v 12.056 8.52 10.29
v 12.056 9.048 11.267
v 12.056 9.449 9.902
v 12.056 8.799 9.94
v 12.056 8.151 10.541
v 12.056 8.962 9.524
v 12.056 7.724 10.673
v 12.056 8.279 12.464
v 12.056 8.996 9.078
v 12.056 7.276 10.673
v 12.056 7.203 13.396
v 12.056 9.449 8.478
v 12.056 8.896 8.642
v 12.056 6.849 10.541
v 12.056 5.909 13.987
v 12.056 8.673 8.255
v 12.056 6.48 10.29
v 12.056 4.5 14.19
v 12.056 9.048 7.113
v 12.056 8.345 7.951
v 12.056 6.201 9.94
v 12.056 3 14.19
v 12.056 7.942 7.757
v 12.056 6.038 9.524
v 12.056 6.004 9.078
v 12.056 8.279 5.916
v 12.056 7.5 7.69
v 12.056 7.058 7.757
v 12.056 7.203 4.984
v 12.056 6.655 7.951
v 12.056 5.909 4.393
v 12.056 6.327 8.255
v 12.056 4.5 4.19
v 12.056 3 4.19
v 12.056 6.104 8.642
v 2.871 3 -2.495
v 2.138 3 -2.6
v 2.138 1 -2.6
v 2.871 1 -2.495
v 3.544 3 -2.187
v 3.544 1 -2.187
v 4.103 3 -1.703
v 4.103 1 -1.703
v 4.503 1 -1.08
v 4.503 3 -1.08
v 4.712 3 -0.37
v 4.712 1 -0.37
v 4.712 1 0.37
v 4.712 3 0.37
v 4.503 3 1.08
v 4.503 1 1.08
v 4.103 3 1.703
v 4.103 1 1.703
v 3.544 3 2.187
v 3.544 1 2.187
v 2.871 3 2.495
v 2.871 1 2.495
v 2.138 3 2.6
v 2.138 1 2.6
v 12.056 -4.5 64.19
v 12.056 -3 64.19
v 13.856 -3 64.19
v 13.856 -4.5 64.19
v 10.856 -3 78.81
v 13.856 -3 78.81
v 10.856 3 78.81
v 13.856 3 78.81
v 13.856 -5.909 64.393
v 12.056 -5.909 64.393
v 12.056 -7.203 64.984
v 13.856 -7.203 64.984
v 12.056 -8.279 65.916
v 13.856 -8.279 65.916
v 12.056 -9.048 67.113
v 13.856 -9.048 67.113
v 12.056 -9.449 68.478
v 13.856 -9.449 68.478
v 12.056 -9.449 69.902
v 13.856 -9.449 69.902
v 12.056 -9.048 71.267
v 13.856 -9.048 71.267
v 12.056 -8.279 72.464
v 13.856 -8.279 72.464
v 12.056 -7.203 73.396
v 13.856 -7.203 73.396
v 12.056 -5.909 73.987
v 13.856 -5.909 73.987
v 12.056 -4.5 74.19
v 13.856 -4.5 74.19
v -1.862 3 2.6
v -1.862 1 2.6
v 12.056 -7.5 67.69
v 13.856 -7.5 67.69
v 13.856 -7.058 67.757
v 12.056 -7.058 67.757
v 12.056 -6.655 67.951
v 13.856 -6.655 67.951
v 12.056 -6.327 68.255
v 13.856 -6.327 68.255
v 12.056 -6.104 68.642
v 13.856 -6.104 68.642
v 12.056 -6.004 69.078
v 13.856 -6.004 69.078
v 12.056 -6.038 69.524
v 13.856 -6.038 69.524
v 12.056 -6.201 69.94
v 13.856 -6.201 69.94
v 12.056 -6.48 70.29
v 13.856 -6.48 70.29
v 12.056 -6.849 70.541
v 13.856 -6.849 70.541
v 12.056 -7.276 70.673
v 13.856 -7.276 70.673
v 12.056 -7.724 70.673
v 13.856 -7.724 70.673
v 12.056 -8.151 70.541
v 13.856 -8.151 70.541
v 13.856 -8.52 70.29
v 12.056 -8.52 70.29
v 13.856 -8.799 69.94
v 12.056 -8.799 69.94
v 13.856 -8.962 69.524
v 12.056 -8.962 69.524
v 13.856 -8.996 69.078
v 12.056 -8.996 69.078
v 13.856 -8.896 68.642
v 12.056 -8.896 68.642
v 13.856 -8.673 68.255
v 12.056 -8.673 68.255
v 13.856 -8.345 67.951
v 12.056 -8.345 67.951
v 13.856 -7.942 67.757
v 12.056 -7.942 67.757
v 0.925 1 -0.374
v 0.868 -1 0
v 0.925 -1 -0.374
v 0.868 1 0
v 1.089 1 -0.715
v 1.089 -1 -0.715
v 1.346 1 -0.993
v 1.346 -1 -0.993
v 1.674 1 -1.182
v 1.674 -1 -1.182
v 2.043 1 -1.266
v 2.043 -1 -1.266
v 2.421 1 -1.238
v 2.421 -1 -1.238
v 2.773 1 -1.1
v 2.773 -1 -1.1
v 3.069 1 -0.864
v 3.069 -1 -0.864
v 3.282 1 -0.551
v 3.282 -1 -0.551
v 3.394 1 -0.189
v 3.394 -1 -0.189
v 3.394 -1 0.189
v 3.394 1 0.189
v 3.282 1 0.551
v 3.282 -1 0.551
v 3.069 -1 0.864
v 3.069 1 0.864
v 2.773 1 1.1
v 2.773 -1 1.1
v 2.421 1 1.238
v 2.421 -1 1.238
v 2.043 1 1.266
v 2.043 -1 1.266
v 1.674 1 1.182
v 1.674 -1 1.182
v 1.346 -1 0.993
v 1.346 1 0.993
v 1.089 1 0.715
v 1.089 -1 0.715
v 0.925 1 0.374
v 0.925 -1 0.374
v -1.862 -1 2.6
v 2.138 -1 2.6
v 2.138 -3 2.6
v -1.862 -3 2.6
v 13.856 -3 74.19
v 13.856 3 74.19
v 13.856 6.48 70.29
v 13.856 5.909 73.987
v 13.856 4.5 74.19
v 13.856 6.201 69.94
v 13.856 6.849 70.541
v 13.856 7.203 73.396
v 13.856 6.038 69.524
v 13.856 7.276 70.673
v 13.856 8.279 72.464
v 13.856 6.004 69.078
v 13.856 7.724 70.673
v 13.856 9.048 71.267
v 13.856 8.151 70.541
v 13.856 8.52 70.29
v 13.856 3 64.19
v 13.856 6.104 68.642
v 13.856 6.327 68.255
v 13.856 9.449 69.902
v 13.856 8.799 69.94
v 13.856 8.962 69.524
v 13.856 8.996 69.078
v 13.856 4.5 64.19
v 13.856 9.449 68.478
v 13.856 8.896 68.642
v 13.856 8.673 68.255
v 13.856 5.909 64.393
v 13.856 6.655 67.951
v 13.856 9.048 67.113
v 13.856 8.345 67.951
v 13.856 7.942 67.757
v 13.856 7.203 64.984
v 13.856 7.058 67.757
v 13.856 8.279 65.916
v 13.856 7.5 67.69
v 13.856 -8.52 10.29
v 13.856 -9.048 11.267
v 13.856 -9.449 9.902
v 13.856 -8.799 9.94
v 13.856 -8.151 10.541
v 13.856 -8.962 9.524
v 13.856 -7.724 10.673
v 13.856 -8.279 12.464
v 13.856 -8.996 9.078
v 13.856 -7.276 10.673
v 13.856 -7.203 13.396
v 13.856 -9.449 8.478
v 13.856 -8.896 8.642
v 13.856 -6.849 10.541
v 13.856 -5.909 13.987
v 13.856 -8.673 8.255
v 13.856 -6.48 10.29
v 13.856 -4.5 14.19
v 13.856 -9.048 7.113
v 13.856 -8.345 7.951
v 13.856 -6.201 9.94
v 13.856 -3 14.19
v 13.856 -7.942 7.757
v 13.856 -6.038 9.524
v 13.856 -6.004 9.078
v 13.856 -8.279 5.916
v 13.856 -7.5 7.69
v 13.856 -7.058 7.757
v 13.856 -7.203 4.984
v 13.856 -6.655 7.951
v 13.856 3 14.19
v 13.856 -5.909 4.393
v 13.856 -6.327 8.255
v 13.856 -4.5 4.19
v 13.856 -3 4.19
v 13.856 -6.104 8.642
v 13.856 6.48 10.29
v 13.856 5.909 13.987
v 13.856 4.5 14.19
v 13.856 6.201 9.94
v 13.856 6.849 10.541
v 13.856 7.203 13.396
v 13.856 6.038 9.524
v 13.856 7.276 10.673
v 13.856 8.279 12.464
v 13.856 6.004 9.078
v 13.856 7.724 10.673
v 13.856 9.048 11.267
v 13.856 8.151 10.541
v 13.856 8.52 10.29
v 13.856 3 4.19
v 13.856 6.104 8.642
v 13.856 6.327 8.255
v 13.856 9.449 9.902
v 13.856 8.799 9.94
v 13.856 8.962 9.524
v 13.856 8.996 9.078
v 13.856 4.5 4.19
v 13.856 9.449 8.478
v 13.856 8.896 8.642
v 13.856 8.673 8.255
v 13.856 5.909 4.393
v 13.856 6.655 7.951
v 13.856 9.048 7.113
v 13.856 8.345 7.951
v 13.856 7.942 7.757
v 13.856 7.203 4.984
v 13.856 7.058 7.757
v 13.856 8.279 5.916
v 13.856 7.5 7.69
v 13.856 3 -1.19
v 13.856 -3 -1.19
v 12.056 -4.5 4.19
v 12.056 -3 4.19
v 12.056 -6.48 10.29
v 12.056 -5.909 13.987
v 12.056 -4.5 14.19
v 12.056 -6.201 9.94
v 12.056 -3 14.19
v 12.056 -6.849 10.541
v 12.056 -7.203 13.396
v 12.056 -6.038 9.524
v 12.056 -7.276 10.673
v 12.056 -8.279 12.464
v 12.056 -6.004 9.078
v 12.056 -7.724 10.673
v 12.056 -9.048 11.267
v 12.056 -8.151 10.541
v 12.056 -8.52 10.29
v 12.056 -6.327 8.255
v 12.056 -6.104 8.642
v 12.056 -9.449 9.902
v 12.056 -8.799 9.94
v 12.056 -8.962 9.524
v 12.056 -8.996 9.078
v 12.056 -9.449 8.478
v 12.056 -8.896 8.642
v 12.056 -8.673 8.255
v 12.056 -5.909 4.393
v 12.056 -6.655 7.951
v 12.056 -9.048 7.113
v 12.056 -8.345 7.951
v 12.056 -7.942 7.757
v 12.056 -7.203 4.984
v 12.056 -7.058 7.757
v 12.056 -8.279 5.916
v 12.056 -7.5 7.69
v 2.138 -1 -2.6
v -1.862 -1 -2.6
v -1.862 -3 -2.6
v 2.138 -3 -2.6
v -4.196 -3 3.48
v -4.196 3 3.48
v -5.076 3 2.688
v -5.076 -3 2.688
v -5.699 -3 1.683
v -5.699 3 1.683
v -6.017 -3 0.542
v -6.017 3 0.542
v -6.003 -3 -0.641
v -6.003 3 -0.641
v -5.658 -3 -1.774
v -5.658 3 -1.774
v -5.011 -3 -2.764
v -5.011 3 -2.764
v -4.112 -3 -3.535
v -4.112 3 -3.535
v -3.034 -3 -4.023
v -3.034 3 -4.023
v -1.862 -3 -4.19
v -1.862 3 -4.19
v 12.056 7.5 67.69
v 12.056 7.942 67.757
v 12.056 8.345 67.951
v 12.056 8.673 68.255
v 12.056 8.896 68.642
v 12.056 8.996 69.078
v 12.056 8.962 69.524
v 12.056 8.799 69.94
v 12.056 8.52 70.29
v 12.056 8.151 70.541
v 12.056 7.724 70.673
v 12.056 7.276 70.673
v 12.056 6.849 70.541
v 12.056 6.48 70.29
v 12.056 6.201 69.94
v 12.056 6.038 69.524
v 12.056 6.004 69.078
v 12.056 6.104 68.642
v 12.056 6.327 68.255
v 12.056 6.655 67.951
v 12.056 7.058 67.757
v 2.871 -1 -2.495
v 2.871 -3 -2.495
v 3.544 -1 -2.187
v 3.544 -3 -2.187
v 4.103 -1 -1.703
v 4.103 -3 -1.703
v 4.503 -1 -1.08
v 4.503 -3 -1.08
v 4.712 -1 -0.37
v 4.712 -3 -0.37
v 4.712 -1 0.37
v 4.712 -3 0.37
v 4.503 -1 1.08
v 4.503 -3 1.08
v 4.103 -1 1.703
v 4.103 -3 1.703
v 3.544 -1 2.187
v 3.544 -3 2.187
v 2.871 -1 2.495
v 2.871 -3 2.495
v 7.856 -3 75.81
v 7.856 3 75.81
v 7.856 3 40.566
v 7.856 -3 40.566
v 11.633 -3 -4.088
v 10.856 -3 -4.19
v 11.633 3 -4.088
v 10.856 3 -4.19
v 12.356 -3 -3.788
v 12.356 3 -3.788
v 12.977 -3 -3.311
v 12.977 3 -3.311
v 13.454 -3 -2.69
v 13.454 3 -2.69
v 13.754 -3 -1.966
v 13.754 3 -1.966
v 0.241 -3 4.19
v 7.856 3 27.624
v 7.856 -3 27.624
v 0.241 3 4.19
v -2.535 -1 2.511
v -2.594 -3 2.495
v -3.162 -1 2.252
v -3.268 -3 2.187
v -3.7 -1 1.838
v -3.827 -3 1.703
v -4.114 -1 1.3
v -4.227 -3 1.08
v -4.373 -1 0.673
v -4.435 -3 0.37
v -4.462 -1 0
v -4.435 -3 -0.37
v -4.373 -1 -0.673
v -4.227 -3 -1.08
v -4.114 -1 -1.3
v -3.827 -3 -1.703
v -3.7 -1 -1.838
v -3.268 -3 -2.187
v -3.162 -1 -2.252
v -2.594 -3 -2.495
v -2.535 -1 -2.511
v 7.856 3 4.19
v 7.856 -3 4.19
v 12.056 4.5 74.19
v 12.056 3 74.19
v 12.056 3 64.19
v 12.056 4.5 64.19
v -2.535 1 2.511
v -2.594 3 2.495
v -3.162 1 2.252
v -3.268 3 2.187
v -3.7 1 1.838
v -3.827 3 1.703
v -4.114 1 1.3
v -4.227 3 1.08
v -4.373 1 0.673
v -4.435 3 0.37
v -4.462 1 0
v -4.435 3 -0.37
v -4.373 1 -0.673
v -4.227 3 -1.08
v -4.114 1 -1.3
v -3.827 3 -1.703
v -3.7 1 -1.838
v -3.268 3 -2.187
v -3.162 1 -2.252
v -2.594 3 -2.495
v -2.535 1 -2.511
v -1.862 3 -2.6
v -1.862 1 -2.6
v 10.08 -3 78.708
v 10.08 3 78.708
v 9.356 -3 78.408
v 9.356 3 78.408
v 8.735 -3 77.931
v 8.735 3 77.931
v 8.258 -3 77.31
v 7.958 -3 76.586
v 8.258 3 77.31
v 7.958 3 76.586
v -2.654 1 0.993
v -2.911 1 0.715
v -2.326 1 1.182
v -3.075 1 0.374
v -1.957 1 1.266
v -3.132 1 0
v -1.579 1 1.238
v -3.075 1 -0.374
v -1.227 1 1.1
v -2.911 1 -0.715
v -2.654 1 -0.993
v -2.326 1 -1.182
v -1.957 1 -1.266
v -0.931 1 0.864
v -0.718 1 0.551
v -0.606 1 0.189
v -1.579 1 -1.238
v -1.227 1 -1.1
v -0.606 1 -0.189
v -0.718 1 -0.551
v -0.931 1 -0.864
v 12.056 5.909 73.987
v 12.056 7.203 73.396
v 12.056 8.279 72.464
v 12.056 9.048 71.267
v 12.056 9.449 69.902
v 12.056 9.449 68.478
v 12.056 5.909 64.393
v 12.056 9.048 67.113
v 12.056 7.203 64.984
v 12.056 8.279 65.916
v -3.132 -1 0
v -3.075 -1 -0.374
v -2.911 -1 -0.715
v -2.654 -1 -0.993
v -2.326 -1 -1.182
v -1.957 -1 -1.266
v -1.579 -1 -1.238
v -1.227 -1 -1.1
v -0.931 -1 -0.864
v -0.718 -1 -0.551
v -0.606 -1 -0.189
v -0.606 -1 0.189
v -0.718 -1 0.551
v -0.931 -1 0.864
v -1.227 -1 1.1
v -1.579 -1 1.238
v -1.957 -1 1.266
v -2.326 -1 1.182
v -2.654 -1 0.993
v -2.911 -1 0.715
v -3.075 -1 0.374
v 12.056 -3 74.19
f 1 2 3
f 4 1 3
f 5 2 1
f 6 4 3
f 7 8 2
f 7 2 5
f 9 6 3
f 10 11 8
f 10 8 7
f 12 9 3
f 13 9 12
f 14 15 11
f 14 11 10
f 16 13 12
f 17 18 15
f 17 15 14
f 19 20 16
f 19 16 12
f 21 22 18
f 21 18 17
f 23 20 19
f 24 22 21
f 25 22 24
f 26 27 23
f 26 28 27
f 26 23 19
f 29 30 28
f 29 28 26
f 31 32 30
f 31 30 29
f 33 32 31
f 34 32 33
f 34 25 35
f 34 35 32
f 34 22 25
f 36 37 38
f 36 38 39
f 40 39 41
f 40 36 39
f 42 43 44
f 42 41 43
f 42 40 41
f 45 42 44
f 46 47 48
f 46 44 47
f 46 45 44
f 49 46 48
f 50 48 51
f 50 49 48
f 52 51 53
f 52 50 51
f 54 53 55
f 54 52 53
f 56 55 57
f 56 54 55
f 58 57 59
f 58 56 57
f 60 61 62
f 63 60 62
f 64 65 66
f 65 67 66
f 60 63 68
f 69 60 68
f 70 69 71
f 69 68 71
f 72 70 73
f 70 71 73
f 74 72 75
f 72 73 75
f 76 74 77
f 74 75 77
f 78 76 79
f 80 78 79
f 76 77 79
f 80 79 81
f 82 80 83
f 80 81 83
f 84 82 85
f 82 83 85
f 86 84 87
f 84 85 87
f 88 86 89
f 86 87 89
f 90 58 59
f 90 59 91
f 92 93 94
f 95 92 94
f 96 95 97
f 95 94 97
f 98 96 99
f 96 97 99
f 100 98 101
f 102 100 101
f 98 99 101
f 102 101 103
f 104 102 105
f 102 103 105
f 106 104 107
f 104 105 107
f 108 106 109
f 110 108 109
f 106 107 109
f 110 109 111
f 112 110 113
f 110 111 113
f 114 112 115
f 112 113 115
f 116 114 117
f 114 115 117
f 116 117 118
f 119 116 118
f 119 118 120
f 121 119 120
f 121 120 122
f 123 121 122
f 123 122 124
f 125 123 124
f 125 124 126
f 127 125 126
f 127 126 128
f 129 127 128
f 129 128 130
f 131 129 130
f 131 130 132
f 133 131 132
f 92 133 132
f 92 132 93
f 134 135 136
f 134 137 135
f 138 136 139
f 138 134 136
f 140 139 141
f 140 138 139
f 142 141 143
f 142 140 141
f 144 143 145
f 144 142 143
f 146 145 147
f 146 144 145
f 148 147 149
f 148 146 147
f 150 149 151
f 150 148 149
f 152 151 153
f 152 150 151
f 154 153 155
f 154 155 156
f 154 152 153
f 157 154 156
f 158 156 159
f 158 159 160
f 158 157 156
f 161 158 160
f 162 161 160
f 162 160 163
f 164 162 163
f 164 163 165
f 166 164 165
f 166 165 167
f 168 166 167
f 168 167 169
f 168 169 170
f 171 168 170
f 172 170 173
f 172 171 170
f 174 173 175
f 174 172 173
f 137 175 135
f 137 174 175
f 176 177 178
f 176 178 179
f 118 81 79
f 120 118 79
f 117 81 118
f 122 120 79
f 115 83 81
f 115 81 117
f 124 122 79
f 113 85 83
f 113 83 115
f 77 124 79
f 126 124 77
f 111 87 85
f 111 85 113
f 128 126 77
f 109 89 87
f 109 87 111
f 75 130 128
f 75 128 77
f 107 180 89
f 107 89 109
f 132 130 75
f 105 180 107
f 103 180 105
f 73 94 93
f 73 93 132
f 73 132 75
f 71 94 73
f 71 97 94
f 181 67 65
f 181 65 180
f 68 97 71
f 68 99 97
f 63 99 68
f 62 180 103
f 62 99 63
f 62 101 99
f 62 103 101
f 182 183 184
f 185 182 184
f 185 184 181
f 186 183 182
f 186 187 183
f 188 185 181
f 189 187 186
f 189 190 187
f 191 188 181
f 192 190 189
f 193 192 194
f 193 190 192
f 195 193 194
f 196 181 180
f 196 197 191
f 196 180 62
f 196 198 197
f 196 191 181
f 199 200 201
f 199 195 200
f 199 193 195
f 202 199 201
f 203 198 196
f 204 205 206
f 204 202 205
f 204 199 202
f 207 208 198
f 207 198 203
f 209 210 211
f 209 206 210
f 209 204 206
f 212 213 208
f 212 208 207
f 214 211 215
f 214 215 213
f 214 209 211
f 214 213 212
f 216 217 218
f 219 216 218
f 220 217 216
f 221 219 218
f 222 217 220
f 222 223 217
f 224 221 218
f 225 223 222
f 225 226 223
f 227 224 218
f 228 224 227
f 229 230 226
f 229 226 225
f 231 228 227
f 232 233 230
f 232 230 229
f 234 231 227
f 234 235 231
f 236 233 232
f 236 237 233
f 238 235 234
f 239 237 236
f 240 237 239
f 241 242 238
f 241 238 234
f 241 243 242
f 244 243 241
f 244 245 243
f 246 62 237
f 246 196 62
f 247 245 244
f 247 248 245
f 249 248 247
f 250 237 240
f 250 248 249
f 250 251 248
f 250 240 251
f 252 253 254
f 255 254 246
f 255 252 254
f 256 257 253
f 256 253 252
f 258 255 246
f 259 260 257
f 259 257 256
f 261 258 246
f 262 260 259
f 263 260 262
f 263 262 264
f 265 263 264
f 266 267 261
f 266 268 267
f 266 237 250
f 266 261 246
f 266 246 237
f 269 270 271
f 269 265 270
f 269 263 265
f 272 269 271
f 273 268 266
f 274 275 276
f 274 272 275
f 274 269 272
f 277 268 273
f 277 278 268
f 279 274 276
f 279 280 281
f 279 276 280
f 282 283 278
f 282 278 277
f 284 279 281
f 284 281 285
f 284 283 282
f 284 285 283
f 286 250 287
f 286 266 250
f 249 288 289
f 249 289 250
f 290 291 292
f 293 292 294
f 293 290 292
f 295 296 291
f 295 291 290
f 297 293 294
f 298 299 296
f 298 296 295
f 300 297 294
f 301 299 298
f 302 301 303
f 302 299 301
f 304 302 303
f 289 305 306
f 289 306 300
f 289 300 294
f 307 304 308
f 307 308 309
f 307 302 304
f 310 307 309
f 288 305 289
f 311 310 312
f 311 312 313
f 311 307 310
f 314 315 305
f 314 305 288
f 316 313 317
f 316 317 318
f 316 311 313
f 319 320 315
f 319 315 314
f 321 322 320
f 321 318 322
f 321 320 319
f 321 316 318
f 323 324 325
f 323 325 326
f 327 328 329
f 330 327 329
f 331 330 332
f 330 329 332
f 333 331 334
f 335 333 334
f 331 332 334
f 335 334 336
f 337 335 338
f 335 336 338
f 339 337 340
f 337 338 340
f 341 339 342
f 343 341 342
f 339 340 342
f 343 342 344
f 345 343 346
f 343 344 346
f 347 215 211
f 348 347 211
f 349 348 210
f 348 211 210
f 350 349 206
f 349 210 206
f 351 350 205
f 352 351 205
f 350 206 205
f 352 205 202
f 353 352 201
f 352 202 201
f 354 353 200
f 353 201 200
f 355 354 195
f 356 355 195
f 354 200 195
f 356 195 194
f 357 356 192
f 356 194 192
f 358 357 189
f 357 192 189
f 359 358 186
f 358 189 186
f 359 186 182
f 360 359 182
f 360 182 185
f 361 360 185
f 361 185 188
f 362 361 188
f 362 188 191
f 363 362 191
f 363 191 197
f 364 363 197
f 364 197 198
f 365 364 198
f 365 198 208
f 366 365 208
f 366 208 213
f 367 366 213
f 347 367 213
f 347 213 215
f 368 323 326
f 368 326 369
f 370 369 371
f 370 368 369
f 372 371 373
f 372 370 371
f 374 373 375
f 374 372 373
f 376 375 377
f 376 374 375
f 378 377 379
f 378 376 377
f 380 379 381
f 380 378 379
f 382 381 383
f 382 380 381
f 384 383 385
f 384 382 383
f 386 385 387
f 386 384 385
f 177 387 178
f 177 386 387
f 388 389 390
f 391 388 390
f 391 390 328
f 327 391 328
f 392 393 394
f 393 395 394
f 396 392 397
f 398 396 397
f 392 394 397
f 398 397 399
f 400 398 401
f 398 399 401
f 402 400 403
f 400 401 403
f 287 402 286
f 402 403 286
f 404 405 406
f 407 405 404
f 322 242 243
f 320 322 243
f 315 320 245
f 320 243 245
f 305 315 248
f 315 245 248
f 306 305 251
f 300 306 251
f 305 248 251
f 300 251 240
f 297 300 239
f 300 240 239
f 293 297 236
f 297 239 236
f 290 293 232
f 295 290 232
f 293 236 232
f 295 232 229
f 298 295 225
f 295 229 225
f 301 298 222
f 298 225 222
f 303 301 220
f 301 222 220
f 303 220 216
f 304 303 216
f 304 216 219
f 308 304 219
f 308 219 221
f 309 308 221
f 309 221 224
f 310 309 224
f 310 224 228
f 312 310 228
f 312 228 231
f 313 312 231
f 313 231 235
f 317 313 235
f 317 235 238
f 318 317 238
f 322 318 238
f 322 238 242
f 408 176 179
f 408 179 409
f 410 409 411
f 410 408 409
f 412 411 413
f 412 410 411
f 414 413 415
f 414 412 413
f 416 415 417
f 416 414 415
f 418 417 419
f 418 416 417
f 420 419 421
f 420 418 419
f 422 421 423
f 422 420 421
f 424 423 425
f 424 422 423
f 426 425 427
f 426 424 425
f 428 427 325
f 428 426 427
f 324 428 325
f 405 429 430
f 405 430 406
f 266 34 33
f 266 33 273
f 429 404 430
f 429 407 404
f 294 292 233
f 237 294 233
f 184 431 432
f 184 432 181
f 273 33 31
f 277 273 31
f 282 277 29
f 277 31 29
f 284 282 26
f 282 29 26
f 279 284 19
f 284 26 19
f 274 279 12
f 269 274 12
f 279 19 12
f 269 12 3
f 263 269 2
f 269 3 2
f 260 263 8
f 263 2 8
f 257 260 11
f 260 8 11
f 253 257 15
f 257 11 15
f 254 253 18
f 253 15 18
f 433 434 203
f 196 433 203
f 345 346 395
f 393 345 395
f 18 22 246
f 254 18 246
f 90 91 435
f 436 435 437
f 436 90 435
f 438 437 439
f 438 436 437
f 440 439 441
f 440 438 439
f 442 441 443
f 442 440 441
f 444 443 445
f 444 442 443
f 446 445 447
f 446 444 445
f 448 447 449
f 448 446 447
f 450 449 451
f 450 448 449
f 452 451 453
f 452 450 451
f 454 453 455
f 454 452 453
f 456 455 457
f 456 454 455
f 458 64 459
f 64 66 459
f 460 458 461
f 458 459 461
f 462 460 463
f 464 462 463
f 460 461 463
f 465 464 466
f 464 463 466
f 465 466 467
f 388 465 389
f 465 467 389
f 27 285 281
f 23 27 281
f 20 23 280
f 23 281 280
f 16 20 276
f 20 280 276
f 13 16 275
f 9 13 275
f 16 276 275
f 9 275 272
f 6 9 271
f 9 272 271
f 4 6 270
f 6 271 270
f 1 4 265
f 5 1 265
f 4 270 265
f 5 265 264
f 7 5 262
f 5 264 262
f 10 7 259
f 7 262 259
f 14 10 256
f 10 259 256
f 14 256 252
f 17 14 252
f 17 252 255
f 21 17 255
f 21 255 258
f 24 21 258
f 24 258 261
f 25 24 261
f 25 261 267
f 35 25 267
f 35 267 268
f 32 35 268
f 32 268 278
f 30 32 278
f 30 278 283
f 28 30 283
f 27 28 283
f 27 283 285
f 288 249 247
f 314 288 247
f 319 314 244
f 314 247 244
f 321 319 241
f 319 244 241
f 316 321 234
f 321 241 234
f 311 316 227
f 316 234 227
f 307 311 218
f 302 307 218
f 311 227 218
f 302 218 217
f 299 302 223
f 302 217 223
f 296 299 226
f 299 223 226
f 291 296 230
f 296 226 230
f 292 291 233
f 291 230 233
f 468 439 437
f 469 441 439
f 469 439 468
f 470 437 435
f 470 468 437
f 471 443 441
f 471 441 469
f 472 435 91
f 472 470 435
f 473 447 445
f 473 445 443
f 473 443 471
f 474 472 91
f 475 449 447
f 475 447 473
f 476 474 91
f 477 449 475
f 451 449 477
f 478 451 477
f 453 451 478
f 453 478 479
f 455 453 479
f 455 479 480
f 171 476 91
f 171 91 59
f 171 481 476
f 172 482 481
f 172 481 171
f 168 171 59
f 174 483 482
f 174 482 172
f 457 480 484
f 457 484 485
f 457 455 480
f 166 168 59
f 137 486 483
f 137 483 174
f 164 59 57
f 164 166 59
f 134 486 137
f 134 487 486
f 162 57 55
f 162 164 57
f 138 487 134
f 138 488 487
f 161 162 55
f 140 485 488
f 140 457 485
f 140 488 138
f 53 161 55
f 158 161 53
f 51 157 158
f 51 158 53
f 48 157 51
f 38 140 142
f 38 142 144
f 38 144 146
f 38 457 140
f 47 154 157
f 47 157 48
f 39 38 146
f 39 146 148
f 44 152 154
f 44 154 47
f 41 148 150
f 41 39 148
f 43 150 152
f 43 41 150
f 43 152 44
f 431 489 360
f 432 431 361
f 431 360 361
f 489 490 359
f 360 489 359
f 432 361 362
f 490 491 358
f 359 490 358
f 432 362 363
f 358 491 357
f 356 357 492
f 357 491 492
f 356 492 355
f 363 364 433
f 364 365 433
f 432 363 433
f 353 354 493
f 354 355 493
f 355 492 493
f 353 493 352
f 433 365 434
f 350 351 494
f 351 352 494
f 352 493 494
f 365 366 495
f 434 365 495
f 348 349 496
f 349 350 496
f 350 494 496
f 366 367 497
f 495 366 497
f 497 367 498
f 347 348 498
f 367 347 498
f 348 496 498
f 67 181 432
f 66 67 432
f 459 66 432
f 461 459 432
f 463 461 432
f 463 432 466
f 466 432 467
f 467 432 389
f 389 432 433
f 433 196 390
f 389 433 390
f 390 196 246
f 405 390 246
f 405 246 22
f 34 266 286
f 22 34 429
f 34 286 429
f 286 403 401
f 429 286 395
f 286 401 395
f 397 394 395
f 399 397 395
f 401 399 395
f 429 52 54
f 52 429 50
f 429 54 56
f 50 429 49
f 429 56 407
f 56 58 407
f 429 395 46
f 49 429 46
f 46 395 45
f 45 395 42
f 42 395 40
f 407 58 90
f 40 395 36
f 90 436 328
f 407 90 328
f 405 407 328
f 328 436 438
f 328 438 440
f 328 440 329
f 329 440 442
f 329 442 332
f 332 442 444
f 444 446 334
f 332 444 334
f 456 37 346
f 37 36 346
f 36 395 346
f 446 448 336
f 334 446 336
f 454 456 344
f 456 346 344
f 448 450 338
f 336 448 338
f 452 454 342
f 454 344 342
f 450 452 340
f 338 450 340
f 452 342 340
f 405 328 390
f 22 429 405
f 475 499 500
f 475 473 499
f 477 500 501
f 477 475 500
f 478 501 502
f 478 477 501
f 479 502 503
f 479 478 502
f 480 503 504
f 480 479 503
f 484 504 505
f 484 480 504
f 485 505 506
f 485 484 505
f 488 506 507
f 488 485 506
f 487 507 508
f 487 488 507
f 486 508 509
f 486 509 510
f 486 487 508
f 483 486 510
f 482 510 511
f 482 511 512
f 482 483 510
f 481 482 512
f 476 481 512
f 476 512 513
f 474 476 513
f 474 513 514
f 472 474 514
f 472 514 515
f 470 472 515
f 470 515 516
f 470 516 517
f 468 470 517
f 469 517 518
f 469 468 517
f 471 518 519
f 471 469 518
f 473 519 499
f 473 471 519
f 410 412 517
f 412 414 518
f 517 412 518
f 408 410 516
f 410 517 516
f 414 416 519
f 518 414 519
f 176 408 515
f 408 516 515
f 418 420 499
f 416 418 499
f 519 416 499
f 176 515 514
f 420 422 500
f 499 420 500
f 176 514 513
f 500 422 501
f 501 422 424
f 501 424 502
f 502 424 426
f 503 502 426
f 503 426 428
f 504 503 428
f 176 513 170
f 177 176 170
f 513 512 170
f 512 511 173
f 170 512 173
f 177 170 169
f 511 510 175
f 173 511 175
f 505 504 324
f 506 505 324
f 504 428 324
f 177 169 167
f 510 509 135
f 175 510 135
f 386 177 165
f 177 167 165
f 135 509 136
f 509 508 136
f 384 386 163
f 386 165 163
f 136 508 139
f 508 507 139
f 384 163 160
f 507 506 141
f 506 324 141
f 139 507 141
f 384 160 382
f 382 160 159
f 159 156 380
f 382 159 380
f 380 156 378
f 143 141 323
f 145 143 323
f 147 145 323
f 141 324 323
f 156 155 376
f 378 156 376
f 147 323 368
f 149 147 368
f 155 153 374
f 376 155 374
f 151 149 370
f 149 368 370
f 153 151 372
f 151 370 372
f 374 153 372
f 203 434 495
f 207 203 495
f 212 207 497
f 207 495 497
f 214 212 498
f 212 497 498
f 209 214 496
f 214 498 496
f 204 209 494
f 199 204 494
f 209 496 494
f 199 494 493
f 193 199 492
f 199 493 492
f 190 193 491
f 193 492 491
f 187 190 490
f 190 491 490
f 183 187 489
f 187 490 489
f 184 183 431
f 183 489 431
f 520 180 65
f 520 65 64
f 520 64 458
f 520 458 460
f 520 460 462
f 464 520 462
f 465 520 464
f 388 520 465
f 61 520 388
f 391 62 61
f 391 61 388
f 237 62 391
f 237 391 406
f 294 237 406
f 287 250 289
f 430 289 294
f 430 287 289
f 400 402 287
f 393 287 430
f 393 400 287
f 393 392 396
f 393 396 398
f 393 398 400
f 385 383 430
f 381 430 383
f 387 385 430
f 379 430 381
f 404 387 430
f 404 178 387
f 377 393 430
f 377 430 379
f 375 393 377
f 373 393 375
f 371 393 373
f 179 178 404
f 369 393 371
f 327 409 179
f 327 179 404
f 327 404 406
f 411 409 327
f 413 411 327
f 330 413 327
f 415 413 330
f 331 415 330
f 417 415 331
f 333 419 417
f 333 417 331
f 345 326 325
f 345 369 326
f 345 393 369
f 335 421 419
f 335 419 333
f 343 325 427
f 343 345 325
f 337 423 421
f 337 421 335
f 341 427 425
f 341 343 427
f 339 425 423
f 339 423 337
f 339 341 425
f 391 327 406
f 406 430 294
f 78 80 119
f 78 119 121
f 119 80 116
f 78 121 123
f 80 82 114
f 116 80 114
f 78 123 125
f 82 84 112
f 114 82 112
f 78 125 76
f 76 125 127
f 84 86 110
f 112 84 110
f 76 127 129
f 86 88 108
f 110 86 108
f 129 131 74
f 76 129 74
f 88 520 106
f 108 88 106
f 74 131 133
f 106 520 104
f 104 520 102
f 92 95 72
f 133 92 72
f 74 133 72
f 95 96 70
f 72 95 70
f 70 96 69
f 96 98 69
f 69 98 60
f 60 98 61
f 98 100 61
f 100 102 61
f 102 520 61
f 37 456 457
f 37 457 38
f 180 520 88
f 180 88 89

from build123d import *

# Parameters (mm, degrees)
SALIENTE_EXTRUIR1_DEPTH = 3
SALIENTE_EXTRUIR2_DEPTH = 1
CROQUIS1_7_W            = 1.8
CROQUIS1_7_H            = 10
SALIENTE_EXTRUIR4_DEPTH = 9.5
REDONDEO2_R             = 5
CROQUIS3_R              = 1.5
CORTAR_EXTRUIR2_DEPTH   = 16


with BuildPart() as part:
    # Croquis1 → Saliente-Extruir1 (new, symmetric)
    with BuildSketch(Plane(origin=(0, 0, 0), x_dir=(1, 0, 0), z_dir=(0, 1, 0))):
        with BuildLine():
            Line((-1.861867424, 4.190006044), (10.856046359, 4.190006044))
            ThreePointArc((10.856046359, 4.190006044), (12.977366702, 3.311326387), (13.856046359, 1.190006044))
            Line((13.856046359, 1.190006044), (13.856046359, -78.809993956))
            Line((13.856046359, -78.809993956), (10.856046359, -78.809993956))
            ThreePointArc((10.856046359, -78.809993956), (8.734726015, -77.9313143), (7.856046359, -75.809993956))
            Line((7.856046359, -75.809993956), (7.856046359, -40.566421369))
            Line((7.856046359, -40.566421369), (-4.195556186, -3.47994934))
            ThreePointArc((-4.195556186, -3.47994934), (-5.870430721, 1.219660174), (-1.861867424, 4.190006044))
        make_face()
        with BuildLine():
            Line((-1.861867424, 2.6), (2.138132576, 2.6))
            ThreePointArc((2.138132576, 2.6), (4.738132576, 0), (2.138132576, -2.6))
            Line((2.138132576, -2.6), (-1.861867424, -2.6))
            ThreePointArc((-1.861867424, -2.6), (-4.461867424, 0), (-1.861867424, 2.6))
        make_face(mode=Mode.SUBTRACT)
        Polygon((0.241081645, -4.190006044), (7.856046359, -4.190006044), (7.856046359, -27.623584675), align=None, mode=Mode.SUBTRACT)
    extrude(amount=SALIENTE_EXTRUIR1_DEPTH, both=True)

    # Croquis1<3> → Saliente-Extruir2 (add, symmetric)
    with BuildSketch(Plane(origin=(0, 0, 0), x_dir=(1, 0, 0), z_dir=(0, 1, 0))):
        with BuildLine():
            ThreePointArc((-1.861867424, 2.6), (-3.700345055, 1.838477631), (-4.461867424, 0))
            ThreePointArc((-4.461867424, 0), (-3.700345055, -1.838477631), (-1.861867424, -2.6))
            Line((-1.861867424, -2.6), (2.138132576, -2.6))
            ThreePointArc((2.138132576, -2.6), (4.738132576, 0), (2.138132576, 2.6))
            Line((2.138132576, 2.6), (-1.861867424, 2.6))
        make_face()
        with BuildLine():
            ThreePointArc((-0.591867424, 0), (-1.861867424, -1.27), (-3.131867424, 0))
            ThreePointArc((-3.131867424, 0), (-1.861867424, 1.27), (-0.591867424, 0))
        make_face(mode=Mode.SUBTRACT)
        with BuildLine():
            ThreePointArc((3.408132576, 0), (2.138132576, -1.27), (0.868132576, 0))
            ThreePointArc((0.868132576, 0), (2.138132576, 1.27), (3.408132576, 0))
        make_face(mode=Mode.SUBTRACT)
    extrude(amount=SALIENTE_EXTRUIR2_DEPTH, both=True)

    # Croquis1<7> → Saliente-Extruir4 (add, symmetric)
    with BuildSketch(Plane(origin=(0, 0, 0), x_dir=(1, 0, 0), z_dir=(0, 1, 0))):
        with Locations((12.956046359, -9.190006044)):
            Rectangle(CROQUIS1_7_W, CROQUIS1_7_H)
        with Locations((12.956046359, -69.190006044)):
            Rectangle(CROQUIS1_7_W, CROQUIS1_7_H)
    extrude(amount=SALIENTE_EXTRUIR4_DEPTH, both=True)

    # Redondeo2
    # the kernel refuses this fillet: 5 mm, written as the material it takes off along each edge
    with BuildSketch(Plane(origin=(-0.443953641, -9.5, 74.190006044), x_dir=(0, 1, 0), z_dir=(1, 0, 0)), Plane(origin=(26.356046359, -9.5, 64.190006044), x_dir=(0, 1, 0), z_dir=(-1, 0, 0)), Plane(origin=(-0.443953641, -9.5, 14.190006044), x_dir=(0, 1, 0), z_dir=(1, 0, 0)), Plane(origin=(26.356046359, -9.5, 4.190006044), x_dir=(0, 1, 0), z_dir=(-1, 0, 0))) as redondeo2_piece_1:
        with BuildLine():
            CenterArc((REDONDEO2_R, -REDONDEO2_R), REDONDEO2_R, 90, 90)
            Line((0, -REDONDEO2_R), (-REDONDEO2_R * 0.02, -REDONDEO2_R))
            Line((-REDONDEO2_R * 0.02, -REDONDEO2_R), (-REDONDEO2_R * 0.02, REDONDEO2_R * 0.02))
            Line((-REDONDEO2_R * 0.02, REDONDEO2_R * 0.02), (REDONDEO2_R, REDONDEO2_R * 0.02))
            Line((REDONDEO2_R, REDONDEO2_R * 0.02), (REDONDEO2_R, 0))
        make_face()
    extrude(amount=26.8, mode=Mode.SUBTRACT)
    with BuildSketch(Plane(origin=(-0.443953641, 9.5, 74.190006044), x_dir=(0, -1, 0), z_dir=(1, 0, 0)), Plane(origin=(26.356046359, 9.5, 64.190006044), x_dir=(0, -1, 0), z_dir=(-1, 0, 0)), Plane(origin=(-0.443953641, 9.5, 14.190006044), x_dir=(0, -1, 0), z_dir=(1, 0, 0)), Plane(origin=(26.356046359, 9.5, 4.190006044), x_dir=(0, -1, 0), z_dir=(-1, 0, 0))) as redondeo2_piece_2:
        with BuildLine():
            CenterArc((REDONDEO2_R, REDONDEO2_R), REDONDEO2_R, 180, 90)
            Line((0, REDONDEO2_R), (-REDONDEO2_R * 0.02, REDONDEO2_R))
            Line((-REDONDEO2_R * 0.02, REDONDEO2_R), (-REDONDEO2_R * 0.02, -REDONDEO2_R * 0.02))
            Line((-REDONDEO2_R * 0.02, -REDONDEO2_R * 0.02), (REDONDEO2_R, -REDONDEO2_R * 0.02))
            Line((REDONDEO2_R, -REDONDEO2_R * 0.02), (REDONDEO2_R, 0))
        make_face()
    extrude(amount=26.8, mode=Mode.SUBTRACT)

    # Croquis3 → Cortar-Extruir2 (cut)
    with BuildSketch(Plane(origin=(13.856046359, 0, 0), x_dir=(0, 0, -1), z_dir=(1, 0, 0))):
        with Locations((-69.190006044, 7.5)):
            Circle(CROQUIS3_R)
        with Locations((-69.190006044, -7.5)):
            Circle(CROQUIS3_R)
        with Locations((-9.190006044, 7.5)):
            Circle(CROQUIS3_R)
        with Locations((-9.190006044, -7.5)):
            Circle(CROQUIS3_R)
    extrude(amount=-CORTAR_EXTRUIR2_DEPTH, mode=Mode.SUBTRACT)


solid = part.part
